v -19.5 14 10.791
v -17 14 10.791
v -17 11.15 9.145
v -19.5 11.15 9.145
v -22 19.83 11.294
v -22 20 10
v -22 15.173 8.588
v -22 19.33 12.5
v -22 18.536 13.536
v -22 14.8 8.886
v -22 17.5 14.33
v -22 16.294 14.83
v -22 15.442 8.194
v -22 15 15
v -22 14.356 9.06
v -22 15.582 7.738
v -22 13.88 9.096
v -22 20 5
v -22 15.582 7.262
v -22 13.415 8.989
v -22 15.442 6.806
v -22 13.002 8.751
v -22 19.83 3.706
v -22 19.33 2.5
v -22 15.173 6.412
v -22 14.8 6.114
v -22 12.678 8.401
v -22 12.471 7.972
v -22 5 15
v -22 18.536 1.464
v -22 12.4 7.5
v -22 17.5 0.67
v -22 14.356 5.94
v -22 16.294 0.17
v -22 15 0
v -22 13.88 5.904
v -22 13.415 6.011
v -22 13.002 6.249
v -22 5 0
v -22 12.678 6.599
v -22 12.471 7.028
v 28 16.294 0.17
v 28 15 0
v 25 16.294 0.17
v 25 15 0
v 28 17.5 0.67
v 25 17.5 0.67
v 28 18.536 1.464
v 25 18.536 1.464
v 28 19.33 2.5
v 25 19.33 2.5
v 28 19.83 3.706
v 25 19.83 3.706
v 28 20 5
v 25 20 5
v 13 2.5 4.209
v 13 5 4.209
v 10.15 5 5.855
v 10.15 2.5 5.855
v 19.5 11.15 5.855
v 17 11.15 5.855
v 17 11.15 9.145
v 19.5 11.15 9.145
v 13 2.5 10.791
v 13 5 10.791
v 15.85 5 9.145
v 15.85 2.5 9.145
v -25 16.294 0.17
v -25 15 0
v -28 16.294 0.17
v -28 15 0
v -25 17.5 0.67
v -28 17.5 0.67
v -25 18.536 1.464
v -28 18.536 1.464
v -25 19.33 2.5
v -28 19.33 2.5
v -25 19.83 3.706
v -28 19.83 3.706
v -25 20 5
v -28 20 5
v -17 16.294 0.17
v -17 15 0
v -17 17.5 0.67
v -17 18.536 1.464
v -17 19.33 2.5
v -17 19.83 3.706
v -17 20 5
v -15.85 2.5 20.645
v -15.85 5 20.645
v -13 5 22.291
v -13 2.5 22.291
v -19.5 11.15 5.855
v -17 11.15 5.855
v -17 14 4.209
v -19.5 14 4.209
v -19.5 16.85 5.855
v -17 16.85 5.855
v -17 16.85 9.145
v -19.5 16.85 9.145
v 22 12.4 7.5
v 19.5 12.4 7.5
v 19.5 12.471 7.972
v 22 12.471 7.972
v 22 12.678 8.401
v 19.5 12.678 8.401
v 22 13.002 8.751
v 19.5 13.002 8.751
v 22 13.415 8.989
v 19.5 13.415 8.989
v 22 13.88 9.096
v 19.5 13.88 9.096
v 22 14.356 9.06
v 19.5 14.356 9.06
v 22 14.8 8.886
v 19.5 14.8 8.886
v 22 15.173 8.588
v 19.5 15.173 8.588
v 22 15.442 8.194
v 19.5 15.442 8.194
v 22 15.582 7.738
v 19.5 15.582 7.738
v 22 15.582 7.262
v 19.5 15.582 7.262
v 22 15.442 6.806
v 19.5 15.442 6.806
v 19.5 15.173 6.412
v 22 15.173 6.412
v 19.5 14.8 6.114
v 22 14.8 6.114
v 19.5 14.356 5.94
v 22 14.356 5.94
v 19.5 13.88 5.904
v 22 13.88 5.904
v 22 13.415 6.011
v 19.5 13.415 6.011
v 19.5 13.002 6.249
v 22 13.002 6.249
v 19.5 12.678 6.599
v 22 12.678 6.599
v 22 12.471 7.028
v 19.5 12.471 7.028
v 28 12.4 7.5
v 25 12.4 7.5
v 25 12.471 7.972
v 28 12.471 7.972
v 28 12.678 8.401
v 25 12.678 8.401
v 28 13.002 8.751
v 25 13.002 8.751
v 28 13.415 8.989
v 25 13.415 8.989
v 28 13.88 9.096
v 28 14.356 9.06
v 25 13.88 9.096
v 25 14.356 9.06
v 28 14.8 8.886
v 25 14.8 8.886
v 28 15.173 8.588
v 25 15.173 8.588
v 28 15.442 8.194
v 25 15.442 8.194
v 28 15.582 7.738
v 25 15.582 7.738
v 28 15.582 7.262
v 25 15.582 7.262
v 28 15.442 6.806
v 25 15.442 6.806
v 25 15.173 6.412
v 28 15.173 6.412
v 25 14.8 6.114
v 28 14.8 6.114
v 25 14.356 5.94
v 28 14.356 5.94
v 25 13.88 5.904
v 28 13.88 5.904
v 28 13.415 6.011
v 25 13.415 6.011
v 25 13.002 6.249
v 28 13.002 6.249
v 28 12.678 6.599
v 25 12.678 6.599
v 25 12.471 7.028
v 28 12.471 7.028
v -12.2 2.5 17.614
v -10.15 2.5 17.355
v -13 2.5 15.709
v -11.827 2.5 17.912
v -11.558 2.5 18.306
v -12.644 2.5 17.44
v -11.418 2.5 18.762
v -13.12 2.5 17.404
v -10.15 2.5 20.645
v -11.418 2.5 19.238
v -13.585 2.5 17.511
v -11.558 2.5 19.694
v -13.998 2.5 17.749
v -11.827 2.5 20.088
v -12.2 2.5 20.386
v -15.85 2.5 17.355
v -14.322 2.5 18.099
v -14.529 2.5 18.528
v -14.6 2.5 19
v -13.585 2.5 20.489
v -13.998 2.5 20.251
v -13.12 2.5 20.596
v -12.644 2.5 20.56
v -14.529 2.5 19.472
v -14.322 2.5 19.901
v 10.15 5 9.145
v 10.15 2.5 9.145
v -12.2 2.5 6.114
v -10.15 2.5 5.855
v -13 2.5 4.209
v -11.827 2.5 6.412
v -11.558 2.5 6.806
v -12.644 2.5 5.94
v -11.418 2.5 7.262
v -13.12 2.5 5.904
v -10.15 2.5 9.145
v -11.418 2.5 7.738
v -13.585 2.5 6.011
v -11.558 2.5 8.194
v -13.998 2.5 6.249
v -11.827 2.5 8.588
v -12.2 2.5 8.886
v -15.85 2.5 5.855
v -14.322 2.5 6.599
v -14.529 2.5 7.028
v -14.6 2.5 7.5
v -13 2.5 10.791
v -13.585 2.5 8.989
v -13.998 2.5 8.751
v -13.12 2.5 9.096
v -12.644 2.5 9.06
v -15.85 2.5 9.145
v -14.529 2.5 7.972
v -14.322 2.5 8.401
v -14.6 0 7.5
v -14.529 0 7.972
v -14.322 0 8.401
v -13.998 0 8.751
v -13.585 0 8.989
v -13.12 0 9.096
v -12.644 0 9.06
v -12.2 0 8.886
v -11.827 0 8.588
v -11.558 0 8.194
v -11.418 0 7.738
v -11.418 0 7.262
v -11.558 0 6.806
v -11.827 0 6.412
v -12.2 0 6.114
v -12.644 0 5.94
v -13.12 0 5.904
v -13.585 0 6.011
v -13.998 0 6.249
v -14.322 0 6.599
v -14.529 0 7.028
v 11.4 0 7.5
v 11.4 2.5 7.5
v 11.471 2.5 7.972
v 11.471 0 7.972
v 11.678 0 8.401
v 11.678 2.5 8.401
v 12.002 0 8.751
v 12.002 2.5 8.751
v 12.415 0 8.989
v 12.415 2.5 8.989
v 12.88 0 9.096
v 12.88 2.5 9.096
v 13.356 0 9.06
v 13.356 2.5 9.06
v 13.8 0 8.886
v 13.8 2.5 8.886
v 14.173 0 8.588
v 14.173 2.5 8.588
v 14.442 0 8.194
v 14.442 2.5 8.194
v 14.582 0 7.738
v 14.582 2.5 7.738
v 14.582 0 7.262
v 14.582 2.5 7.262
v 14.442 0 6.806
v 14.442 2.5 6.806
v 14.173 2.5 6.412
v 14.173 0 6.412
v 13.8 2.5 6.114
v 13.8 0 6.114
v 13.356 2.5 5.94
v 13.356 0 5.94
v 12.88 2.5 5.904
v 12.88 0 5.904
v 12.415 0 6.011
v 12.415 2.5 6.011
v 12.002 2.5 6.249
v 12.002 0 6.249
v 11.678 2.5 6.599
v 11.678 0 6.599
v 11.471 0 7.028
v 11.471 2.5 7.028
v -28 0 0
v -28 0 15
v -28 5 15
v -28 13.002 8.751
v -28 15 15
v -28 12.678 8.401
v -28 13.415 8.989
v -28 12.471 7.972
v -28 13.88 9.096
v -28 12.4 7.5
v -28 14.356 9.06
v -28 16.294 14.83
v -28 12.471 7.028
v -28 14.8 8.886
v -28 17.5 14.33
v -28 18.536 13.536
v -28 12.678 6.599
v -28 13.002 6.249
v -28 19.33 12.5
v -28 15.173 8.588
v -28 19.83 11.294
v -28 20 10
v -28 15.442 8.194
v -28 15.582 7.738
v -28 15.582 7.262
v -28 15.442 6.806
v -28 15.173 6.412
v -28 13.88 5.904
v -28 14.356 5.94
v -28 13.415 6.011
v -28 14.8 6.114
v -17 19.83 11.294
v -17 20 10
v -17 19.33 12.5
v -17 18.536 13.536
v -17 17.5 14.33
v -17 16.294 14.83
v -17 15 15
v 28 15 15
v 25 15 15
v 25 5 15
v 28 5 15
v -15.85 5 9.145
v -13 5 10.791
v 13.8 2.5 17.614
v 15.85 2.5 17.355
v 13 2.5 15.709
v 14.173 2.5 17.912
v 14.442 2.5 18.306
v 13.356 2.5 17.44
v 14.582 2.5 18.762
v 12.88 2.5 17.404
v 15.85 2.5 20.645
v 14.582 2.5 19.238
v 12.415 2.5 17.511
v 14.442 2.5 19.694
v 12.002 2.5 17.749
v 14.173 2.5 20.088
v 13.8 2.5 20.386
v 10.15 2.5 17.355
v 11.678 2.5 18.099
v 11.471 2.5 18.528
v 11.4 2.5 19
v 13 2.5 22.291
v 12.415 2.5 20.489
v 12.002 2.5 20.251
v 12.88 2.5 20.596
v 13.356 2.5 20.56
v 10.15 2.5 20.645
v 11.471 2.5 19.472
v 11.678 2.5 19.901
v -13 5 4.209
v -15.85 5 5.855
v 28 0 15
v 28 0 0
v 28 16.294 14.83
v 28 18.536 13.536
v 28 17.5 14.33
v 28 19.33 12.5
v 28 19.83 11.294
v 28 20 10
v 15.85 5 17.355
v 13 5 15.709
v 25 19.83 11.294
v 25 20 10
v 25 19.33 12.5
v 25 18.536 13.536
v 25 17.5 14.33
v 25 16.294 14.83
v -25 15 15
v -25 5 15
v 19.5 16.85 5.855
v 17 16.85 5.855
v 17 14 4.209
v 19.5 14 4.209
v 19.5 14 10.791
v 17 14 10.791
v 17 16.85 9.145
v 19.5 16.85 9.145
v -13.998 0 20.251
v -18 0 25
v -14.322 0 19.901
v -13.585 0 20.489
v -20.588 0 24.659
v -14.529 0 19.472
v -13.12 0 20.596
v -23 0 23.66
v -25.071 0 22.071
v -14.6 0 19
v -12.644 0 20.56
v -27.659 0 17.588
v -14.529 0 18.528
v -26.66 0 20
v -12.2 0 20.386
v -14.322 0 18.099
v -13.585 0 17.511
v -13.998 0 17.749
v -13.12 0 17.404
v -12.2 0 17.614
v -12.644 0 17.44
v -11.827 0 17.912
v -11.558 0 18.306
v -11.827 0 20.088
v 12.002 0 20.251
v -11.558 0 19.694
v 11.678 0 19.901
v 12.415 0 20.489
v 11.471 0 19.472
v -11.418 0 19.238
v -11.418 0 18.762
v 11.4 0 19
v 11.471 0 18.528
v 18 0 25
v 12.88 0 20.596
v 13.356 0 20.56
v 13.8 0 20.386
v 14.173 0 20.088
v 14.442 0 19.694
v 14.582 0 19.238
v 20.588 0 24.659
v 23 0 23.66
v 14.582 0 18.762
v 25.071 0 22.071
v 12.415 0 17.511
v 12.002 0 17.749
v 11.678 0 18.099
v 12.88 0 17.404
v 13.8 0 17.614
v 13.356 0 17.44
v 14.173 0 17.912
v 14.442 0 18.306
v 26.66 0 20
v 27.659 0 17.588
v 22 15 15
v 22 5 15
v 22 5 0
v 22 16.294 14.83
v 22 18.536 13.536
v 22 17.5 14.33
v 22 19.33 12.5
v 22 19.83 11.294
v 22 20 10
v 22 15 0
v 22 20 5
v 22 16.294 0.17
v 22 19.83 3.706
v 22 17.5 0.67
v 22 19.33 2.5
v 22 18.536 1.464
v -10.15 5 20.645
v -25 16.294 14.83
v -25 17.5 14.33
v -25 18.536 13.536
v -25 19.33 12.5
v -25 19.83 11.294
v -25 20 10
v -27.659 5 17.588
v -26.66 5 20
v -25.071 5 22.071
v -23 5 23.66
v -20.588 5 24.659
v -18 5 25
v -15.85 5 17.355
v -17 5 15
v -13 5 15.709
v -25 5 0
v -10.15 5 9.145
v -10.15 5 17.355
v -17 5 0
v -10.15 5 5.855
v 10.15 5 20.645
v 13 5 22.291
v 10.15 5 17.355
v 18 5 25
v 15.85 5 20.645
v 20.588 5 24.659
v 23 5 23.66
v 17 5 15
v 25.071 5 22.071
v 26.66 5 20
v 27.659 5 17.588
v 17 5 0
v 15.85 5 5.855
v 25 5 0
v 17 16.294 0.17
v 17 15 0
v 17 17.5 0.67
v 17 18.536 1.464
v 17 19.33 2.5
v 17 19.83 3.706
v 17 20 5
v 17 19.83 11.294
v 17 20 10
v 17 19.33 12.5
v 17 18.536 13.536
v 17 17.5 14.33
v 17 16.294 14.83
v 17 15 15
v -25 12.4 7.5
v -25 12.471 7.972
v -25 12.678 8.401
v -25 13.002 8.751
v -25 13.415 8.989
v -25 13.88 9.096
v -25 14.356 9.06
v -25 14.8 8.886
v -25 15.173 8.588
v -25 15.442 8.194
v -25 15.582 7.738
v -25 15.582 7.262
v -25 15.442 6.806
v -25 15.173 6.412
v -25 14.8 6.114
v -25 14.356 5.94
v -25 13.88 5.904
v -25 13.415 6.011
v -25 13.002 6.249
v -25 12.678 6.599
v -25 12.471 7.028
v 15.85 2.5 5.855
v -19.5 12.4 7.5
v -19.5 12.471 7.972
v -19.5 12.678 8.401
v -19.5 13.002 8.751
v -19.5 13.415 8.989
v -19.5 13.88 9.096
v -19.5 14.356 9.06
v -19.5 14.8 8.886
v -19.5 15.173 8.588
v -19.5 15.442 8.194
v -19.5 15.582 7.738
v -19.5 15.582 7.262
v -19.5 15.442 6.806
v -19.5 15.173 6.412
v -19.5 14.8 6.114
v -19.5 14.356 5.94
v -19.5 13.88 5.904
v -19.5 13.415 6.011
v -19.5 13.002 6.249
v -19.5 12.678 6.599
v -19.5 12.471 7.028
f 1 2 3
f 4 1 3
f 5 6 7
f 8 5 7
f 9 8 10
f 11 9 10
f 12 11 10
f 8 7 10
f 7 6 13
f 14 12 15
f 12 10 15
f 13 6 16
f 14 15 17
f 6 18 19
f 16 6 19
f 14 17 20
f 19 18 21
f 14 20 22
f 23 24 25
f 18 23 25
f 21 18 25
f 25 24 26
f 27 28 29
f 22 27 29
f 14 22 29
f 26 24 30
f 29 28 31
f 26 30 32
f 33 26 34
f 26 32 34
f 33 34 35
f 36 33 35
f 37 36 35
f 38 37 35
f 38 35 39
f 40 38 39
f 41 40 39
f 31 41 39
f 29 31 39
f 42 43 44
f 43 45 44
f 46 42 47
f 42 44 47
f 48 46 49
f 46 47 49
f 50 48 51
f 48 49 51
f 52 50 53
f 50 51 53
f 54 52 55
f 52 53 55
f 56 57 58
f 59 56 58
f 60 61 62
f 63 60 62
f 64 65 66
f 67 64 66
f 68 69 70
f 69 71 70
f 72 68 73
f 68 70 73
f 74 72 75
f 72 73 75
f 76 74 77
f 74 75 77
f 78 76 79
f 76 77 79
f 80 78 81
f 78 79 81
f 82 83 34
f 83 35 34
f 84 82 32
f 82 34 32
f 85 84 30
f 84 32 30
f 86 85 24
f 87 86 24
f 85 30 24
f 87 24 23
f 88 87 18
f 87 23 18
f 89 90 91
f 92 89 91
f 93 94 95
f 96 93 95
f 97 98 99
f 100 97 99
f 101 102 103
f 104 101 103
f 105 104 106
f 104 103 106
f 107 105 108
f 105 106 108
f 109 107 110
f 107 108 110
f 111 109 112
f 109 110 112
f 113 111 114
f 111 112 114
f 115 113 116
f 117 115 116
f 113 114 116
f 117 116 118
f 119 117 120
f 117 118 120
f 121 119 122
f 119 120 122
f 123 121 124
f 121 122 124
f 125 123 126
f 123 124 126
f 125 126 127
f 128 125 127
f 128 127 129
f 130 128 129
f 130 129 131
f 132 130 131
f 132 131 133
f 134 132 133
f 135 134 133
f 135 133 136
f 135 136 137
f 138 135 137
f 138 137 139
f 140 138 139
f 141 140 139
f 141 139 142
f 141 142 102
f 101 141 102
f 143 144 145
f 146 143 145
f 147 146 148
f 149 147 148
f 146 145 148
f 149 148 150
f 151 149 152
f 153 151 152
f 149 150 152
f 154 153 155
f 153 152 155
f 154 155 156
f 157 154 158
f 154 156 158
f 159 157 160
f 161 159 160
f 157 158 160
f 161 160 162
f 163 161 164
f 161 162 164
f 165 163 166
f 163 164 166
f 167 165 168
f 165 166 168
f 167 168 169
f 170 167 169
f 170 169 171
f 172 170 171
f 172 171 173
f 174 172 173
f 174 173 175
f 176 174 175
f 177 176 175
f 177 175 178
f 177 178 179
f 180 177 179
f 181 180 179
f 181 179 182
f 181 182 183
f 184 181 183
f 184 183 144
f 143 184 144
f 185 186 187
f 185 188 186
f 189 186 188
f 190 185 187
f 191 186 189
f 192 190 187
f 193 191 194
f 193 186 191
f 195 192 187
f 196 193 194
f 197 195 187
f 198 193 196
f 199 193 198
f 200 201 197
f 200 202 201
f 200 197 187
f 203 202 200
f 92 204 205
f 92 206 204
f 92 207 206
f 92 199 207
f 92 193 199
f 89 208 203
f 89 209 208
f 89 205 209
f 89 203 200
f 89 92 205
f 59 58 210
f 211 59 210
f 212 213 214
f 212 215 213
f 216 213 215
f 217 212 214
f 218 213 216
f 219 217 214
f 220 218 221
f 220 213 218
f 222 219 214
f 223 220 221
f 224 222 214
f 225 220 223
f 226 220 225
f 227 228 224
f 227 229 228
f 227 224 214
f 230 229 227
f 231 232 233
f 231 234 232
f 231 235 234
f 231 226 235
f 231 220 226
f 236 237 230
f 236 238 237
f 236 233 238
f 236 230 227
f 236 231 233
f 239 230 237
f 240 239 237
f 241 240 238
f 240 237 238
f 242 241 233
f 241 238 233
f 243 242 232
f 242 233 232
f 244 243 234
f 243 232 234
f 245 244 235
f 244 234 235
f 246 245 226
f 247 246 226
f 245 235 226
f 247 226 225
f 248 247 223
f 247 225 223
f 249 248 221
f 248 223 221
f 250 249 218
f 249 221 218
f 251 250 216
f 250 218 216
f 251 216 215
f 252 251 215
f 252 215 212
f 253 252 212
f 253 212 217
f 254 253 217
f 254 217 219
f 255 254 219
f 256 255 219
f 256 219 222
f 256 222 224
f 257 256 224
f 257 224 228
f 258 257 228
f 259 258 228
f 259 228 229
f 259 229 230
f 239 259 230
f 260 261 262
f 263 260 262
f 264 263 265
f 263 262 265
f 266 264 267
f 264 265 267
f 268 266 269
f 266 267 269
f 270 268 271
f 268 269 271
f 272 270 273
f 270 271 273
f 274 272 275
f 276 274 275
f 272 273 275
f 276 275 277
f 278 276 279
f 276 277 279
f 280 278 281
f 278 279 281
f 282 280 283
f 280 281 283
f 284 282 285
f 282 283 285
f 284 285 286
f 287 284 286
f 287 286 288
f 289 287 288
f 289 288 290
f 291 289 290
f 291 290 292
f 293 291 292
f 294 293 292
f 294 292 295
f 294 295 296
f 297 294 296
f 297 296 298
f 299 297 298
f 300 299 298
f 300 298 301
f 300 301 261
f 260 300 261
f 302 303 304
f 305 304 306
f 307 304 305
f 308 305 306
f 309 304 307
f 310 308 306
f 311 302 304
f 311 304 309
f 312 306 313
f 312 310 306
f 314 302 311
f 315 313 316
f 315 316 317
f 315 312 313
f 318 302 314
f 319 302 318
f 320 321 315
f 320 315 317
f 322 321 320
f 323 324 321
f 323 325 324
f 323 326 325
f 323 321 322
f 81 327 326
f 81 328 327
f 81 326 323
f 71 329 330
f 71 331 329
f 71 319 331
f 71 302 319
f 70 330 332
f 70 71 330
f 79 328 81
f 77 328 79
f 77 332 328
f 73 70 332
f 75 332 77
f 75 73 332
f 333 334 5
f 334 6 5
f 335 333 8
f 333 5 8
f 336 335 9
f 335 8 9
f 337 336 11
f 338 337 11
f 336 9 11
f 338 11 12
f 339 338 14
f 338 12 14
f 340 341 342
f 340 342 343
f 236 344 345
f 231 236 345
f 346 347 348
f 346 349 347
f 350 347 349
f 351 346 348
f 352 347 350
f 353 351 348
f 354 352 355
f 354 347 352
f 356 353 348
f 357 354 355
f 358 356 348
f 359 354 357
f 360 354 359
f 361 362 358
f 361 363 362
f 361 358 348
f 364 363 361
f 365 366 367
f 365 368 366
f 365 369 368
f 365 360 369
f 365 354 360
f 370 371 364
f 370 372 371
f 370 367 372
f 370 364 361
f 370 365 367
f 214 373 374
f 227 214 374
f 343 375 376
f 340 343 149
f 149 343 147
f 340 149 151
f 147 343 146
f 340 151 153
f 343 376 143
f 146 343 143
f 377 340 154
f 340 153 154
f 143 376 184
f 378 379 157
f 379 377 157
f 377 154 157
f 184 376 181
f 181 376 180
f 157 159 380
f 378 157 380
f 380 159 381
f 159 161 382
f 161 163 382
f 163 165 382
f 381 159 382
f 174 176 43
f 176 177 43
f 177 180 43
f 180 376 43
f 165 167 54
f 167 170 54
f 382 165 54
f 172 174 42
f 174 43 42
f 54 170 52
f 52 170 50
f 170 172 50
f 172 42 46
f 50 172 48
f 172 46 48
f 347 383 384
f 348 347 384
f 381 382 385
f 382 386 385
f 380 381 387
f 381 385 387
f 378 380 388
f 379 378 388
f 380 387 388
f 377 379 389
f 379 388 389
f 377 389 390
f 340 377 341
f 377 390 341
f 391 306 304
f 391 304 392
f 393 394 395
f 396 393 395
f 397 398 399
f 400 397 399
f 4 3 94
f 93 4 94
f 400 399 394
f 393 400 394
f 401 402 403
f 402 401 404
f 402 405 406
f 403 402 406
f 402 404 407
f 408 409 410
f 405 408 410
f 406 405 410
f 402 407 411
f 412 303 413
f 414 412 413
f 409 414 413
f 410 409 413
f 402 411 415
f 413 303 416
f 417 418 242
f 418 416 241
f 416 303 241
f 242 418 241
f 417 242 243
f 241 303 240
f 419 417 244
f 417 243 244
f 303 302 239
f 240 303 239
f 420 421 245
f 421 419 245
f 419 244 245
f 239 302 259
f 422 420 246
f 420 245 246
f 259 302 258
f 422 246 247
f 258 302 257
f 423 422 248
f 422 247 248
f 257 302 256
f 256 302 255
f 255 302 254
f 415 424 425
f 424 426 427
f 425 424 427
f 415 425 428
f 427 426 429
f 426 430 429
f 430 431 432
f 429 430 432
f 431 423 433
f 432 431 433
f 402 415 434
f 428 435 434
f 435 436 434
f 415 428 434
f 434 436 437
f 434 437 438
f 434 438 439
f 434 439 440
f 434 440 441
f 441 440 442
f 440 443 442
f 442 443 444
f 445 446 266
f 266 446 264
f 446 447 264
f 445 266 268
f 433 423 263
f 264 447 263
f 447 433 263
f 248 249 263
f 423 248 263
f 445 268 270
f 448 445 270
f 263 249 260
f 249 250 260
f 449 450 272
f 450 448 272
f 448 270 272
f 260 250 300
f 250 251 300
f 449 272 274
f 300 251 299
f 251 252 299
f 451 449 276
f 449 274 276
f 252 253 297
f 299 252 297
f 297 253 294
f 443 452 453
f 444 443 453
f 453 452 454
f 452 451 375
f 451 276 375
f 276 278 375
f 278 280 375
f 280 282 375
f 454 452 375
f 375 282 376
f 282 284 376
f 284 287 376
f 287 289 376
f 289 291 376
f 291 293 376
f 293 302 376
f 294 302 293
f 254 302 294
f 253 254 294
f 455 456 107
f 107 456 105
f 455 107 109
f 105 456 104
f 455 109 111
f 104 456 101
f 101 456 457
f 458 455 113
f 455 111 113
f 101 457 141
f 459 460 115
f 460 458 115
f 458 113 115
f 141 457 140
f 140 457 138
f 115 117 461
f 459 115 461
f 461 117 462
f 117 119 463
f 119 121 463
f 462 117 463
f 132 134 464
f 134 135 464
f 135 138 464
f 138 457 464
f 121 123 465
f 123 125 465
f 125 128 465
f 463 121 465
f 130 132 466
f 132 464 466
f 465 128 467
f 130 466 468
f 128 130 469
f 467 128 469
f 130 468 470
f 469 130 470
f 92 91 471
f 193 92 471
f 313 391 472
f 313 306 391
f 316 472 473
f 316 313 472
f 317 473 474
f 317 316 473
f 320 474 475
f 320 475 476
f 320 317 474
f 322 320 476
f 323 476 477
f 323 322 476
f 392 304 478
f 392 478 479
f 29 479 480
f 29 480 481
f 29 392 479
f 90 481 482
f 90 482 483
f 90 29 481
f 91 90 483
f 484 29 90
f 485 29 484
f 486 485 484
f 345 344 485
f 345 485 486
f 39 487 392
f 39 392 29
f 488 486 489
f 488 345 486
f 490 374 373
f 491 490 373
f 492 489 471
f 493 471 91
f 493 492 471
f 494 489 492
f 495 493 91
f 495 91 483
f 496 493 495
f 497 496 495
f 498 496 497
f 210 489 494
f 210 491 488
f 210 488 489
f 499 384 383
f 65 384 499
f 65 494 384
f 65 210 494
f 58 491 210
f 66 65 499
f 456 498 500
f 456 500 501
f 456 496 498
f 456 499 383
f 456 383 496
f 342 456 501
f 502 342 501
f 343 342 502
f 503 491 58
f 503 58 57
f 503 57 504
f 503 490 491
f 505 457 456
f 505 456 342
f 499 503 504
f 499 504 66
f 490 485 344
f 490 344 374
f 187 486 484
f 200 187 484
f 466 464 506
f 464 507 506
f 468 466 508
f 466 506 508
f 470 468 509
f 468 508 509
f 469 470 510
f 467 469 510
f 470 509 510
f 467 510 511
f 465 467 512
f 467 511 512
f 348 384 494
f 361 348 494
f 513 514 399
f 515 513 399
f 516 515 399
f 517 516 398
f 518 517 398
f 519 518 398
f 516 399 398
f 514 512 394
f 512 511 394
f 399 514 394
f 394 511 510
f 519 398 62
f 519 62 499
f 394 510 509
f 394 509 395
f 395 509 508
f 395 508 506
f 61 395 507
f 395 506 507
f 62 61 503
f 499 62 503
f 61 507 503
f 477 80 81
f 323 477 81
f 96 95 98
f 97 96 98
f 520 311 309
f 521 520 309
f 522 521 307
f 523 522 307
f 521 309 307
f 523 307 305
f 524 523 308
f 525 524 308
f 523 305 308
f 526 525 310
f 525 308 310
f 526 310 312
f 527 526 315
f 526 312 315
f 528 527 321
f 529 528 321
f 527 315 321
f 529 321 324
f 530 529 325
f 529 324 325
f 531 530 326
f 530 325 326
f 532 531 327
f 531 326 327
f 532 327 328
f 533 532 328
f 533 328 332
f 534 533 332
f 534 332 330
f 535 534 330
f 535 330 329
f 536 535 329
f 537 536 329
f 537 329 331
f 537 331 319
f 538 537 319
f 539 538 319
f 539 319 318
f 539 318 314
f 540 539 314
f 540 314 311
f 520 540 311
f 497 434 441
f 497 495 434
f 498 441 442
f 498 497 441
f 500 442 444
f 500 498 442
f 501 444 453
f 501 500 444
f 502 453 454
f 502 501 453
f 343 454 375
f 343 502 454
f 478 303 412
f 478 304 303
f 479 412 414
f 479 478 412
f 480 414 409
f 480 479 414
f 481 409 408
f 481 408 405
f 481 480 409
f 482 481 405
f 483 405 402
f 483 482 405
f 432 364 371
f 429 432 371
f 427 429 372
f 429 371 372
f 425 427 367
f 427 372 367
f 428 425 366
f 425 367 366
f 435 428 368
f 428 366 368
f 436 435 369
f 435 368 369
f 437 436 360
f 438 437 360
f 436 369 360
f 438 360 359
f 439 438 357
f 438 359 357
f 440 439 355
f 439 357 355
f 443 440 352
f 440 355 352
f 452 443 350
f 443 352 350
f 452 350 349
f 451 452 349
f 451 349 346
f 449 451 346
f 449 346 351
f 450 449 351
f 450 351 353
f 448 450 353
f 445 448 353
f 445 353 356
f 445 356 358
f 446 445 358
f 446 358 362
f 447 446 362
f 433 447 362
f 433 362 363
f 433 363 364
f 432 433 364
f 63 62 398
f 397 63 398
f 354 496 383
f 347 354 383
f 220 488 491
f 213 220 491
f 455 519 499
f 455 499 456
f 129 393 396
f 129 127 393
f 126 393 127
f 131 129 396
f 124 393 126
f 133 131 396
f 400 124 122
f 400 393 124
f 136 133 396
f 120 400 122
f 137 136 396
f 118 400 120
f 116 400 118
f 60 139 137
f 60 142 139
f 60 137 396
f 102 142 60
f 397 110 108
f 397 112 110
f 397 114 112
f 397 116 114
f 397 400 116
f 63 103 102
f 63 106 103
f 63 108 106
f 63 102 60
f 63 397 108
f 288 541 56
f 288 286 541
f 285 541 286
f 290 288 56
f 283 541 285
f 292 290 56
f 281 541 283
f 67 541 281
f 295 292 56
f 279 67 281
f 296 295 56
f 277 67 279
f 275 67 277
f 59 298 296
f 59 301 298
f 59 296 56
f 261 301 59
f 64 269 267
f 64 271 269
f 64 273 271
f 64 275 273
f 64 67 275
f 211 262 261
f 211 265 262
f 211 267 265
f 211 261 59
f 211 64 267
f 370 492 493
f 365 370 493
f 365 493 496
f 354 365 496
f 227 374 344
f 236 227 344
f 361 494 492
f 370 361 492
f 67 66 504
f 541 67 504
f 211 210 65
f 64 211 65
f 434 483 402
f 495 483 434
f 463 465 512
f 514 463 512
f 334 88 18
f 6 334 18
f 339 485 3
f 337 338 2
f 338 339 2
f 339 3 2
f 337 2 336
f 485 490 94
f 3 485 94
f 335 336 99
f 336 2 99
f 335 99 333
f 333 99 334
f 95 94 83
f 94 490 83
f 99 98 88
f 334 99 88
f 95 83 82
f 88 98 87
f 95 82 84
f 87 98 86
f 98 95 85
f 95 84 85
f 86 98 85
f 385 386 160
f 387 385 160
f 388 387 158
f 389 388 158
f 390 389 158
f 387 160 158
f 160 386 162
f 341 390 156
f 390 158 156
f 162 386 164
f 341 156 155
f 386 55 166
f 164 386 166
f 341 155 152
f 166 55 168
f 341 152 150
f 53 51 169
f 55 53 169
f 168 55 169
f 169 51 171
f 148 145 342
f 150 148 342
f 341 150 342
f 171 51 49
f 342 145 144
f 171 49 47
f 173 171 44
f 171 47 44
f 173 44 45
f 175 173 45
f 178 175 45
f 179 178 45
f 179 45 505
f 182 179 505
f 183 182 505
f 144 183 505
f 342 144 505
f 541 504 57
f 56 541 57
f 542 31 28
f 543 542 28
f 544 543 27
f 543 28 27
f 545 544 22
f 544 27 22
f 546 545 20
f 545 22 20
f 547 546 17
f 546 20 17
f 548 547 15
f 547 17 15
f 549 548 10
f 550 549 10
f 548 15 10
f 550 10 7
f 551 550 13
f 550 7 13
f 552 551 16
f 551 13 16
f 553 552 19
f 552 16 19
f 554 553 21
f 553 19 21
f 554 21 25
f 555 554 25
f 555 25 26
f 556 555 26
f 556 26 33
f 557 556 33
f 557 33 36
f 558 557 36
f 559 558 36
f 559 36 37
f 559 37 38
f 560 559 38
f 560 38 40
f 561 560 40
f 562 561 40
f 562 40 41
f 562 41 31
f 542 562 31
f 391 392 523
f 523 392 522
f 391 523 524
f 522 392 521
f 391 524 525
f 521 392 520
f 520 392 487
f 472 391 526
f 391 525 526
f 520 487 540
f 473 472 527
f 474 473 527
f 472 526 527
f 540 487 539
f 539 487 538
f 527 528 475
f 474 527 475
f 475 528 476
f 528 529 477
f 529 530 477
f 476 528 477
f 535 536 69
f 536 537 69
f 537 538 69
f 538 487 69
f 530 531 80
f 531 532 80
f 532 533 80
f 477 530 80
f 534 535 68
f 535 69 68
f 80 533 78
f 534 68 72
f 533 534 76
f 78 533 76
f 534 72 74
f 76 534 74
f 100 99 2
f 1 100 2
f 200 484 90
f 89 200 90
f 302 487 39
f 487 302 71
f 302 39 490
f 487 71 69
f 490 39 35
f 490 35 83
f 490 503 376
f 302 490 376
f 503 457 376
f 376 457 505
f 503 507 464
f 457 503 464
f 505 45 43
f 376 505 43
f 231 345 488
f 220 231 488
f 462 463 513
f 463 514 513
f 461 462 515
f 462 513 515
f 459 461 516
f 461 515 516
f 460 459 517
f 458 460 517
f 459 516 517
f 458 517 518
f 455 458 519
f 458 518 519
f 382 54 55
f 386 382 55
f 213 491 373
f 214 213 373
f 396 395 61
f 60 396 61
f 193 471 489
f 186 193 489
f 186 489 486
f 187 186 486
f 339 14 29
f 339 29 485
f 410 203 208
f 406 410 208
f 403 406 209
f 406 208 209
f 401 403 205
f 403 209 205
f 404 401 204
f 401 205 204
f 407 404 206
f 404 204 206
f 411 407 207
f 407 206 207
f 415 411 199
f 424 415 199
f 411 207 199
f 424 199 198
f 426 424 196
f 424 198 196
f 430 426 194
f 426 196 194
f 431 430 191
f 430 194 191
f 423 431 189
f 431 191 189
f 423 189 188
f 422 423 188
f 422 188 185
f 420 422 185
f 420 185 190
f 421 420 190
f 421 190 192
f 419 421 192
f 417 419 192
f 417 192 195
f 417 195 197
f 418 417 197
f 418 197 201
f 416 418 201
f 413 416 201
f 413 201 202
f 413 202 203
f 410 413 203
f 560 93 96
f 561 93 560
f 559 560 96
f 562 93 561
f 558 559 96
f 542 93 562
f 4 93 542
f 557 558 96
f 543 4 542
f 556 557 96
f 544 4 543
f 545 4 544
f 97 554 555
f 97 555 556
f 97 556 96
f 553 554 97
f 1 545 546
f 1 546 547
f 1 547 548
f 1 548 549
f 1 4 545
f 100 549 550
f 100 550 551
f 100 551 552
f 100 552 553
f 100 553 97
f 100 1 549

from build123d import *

# Parameters (mm, degrees)
F1_DEPTH  = 15
F2_R      = 1.6
F3_DEPTH  = 56.001
F5_DEPTH  = 2.5
F7_DEPTH  = 2.5
F8_W      = 56
F8_H      = 5
F9_DEPTH  = 10
F10_R     = 1.6
F11_DEPTH = 5.001
F13_DEPTH = 2.5
F14_R     = 10
F15_R     = 5


with BuildPart() as f1:
    # F0 (on Top) → F1 (new body)
    with BuildSketch(Plane.XY):
        Polygon((-28, 20), (-28, 0), (28, 0), (28, 20), (25, 20), (25, 5), (22, 5), (22, 20), (17, 20), (17, 5), (-17, 5), (-17, 20), (-22, 20), (-22, 5), (-25, 5), (-25, 20), align=None)
    extrude(amount=F1_DEPTH)

    # F2 (on face) → F3 (cut, through all)
    with BuildSketch(Plane(origin=(-28, 0, 0), x_dir=(0, -1, 0), z_dir=(-1, 0, 0))):
        with Locations((-14, 7.5)):
            Circle(F2_R)
    extrude(amount=-F3_DEPTH, mode=Mode.SUBTRACT)

    # F4 (on face) → F5 (cut)
    with BuildSketch(Plane.YZ.offset(-17)):
        Polygon((16.85, 5.854552), (16.85, 9.145448), (14, 10.790897), (11.15, 9.145448), (11.15, 5.854552), (14, 4.209103), align=None)
    extrude(amount=-F5_DEPTH, mode=Mode.SUBTRACT)

    # F6 (on face) → F7 (cut)
    with BuildSketch(Plane(origin=(17, 0, 0), x_dir=(0, -1, 0), z_dir=(-1, 0, 0))):
        Polygon((-11.15, 5.854552), (-11.15, 9.145448), (-14, 10.790897), (-16.85, 9.145448), (-16.85, 5.854552), (-14, 4.209103), align=None)
    extrude(amount=-F7_DEPTH, mode=Mode.SUBTRACT)

    # F8 (on face) → F9 (join)
    with BuildSketch(Plane.XY.offset(15)):
        with Locations((0, 2.5)):
            Rectangle(F8_W, F8_H)
    extrude(amount=F9_DEPTH)

    # F10 (on face) → F11 (cut, through all)
    with BuildSketch(Plane(origin=(0, 5, 0), x_dir=(-1, 0, 0), z_dir=(0, 1, 0))):
        with Locations((-13, 7.5)):
            Circle(F10_R)
        with Locations((13, 7.5)):
            Circle(F10_R)
        with Locations((-13, 19)):
            Circle(F10_R)
        with Locations((13, 19)):
            Circle(F10_R)
    extrude(amount=-F11_DEPTH, mode=Mode.SUBTRACT)

    # F12 (on face) → F13 (cut)
    with BuildSketch(Plane(origin=(0, 5, 0), x_dir=(-1, 0, 0), z_dir=(0, 1, 0))):
        Polygon((-10.15, 5.854552), (-10.15, 9.145448), (-13, 10.790897), (-15.85, 9.145448), (-15.85, 5.854552), (-13, 4.209103), align=None)
        Polygon((10.15, 9.145448), (10.15, 5.854552), (13, 4.209103), (15.85, 5.854552), (15.85, 9.145448), (13, 10.790897), align=None)
        Polygon((-15.85, 20.645448), (-15.85, 17.354552), (-13, 15.709103), (-10.15, 17.354552), (-10.15, 20.645448), (-13, 22.290897), align=None)
        Polygon((15.85, 17.354552), (15.85, 20.645448), (13, 22.290897), (10.15, 20.645448), (10.15, 17.354552), (13, 15.709103), align=None)
    extrude(amount=-F13_DEPTH, mode=Mode.SUBTRACT)

    # F14
    f14_edges = [f1.edges().sort_by_distance(p)[0] for p in [
        (28, 2.5, 25),
        (-28, 2.5, 25),
    ]]
    fillet(f14_edges, radius=F14_R)

    # F15
    f15_edges = [f1.edges().sort_by_distance(p)[0] for p in [
        (26.5, 20, 15),
        (19.5, 20, 15),
        (26.5, 20, 0),
        (19.5, 20, 0),
        (-19.5, 20, 0),
        (-26.5, 20, 0),
        (-26.5, 20, 15),
        (-19.5, 20, 15),
    ]]
    fillet(f15_edges, radius=F15_R)


solid = f1.part
